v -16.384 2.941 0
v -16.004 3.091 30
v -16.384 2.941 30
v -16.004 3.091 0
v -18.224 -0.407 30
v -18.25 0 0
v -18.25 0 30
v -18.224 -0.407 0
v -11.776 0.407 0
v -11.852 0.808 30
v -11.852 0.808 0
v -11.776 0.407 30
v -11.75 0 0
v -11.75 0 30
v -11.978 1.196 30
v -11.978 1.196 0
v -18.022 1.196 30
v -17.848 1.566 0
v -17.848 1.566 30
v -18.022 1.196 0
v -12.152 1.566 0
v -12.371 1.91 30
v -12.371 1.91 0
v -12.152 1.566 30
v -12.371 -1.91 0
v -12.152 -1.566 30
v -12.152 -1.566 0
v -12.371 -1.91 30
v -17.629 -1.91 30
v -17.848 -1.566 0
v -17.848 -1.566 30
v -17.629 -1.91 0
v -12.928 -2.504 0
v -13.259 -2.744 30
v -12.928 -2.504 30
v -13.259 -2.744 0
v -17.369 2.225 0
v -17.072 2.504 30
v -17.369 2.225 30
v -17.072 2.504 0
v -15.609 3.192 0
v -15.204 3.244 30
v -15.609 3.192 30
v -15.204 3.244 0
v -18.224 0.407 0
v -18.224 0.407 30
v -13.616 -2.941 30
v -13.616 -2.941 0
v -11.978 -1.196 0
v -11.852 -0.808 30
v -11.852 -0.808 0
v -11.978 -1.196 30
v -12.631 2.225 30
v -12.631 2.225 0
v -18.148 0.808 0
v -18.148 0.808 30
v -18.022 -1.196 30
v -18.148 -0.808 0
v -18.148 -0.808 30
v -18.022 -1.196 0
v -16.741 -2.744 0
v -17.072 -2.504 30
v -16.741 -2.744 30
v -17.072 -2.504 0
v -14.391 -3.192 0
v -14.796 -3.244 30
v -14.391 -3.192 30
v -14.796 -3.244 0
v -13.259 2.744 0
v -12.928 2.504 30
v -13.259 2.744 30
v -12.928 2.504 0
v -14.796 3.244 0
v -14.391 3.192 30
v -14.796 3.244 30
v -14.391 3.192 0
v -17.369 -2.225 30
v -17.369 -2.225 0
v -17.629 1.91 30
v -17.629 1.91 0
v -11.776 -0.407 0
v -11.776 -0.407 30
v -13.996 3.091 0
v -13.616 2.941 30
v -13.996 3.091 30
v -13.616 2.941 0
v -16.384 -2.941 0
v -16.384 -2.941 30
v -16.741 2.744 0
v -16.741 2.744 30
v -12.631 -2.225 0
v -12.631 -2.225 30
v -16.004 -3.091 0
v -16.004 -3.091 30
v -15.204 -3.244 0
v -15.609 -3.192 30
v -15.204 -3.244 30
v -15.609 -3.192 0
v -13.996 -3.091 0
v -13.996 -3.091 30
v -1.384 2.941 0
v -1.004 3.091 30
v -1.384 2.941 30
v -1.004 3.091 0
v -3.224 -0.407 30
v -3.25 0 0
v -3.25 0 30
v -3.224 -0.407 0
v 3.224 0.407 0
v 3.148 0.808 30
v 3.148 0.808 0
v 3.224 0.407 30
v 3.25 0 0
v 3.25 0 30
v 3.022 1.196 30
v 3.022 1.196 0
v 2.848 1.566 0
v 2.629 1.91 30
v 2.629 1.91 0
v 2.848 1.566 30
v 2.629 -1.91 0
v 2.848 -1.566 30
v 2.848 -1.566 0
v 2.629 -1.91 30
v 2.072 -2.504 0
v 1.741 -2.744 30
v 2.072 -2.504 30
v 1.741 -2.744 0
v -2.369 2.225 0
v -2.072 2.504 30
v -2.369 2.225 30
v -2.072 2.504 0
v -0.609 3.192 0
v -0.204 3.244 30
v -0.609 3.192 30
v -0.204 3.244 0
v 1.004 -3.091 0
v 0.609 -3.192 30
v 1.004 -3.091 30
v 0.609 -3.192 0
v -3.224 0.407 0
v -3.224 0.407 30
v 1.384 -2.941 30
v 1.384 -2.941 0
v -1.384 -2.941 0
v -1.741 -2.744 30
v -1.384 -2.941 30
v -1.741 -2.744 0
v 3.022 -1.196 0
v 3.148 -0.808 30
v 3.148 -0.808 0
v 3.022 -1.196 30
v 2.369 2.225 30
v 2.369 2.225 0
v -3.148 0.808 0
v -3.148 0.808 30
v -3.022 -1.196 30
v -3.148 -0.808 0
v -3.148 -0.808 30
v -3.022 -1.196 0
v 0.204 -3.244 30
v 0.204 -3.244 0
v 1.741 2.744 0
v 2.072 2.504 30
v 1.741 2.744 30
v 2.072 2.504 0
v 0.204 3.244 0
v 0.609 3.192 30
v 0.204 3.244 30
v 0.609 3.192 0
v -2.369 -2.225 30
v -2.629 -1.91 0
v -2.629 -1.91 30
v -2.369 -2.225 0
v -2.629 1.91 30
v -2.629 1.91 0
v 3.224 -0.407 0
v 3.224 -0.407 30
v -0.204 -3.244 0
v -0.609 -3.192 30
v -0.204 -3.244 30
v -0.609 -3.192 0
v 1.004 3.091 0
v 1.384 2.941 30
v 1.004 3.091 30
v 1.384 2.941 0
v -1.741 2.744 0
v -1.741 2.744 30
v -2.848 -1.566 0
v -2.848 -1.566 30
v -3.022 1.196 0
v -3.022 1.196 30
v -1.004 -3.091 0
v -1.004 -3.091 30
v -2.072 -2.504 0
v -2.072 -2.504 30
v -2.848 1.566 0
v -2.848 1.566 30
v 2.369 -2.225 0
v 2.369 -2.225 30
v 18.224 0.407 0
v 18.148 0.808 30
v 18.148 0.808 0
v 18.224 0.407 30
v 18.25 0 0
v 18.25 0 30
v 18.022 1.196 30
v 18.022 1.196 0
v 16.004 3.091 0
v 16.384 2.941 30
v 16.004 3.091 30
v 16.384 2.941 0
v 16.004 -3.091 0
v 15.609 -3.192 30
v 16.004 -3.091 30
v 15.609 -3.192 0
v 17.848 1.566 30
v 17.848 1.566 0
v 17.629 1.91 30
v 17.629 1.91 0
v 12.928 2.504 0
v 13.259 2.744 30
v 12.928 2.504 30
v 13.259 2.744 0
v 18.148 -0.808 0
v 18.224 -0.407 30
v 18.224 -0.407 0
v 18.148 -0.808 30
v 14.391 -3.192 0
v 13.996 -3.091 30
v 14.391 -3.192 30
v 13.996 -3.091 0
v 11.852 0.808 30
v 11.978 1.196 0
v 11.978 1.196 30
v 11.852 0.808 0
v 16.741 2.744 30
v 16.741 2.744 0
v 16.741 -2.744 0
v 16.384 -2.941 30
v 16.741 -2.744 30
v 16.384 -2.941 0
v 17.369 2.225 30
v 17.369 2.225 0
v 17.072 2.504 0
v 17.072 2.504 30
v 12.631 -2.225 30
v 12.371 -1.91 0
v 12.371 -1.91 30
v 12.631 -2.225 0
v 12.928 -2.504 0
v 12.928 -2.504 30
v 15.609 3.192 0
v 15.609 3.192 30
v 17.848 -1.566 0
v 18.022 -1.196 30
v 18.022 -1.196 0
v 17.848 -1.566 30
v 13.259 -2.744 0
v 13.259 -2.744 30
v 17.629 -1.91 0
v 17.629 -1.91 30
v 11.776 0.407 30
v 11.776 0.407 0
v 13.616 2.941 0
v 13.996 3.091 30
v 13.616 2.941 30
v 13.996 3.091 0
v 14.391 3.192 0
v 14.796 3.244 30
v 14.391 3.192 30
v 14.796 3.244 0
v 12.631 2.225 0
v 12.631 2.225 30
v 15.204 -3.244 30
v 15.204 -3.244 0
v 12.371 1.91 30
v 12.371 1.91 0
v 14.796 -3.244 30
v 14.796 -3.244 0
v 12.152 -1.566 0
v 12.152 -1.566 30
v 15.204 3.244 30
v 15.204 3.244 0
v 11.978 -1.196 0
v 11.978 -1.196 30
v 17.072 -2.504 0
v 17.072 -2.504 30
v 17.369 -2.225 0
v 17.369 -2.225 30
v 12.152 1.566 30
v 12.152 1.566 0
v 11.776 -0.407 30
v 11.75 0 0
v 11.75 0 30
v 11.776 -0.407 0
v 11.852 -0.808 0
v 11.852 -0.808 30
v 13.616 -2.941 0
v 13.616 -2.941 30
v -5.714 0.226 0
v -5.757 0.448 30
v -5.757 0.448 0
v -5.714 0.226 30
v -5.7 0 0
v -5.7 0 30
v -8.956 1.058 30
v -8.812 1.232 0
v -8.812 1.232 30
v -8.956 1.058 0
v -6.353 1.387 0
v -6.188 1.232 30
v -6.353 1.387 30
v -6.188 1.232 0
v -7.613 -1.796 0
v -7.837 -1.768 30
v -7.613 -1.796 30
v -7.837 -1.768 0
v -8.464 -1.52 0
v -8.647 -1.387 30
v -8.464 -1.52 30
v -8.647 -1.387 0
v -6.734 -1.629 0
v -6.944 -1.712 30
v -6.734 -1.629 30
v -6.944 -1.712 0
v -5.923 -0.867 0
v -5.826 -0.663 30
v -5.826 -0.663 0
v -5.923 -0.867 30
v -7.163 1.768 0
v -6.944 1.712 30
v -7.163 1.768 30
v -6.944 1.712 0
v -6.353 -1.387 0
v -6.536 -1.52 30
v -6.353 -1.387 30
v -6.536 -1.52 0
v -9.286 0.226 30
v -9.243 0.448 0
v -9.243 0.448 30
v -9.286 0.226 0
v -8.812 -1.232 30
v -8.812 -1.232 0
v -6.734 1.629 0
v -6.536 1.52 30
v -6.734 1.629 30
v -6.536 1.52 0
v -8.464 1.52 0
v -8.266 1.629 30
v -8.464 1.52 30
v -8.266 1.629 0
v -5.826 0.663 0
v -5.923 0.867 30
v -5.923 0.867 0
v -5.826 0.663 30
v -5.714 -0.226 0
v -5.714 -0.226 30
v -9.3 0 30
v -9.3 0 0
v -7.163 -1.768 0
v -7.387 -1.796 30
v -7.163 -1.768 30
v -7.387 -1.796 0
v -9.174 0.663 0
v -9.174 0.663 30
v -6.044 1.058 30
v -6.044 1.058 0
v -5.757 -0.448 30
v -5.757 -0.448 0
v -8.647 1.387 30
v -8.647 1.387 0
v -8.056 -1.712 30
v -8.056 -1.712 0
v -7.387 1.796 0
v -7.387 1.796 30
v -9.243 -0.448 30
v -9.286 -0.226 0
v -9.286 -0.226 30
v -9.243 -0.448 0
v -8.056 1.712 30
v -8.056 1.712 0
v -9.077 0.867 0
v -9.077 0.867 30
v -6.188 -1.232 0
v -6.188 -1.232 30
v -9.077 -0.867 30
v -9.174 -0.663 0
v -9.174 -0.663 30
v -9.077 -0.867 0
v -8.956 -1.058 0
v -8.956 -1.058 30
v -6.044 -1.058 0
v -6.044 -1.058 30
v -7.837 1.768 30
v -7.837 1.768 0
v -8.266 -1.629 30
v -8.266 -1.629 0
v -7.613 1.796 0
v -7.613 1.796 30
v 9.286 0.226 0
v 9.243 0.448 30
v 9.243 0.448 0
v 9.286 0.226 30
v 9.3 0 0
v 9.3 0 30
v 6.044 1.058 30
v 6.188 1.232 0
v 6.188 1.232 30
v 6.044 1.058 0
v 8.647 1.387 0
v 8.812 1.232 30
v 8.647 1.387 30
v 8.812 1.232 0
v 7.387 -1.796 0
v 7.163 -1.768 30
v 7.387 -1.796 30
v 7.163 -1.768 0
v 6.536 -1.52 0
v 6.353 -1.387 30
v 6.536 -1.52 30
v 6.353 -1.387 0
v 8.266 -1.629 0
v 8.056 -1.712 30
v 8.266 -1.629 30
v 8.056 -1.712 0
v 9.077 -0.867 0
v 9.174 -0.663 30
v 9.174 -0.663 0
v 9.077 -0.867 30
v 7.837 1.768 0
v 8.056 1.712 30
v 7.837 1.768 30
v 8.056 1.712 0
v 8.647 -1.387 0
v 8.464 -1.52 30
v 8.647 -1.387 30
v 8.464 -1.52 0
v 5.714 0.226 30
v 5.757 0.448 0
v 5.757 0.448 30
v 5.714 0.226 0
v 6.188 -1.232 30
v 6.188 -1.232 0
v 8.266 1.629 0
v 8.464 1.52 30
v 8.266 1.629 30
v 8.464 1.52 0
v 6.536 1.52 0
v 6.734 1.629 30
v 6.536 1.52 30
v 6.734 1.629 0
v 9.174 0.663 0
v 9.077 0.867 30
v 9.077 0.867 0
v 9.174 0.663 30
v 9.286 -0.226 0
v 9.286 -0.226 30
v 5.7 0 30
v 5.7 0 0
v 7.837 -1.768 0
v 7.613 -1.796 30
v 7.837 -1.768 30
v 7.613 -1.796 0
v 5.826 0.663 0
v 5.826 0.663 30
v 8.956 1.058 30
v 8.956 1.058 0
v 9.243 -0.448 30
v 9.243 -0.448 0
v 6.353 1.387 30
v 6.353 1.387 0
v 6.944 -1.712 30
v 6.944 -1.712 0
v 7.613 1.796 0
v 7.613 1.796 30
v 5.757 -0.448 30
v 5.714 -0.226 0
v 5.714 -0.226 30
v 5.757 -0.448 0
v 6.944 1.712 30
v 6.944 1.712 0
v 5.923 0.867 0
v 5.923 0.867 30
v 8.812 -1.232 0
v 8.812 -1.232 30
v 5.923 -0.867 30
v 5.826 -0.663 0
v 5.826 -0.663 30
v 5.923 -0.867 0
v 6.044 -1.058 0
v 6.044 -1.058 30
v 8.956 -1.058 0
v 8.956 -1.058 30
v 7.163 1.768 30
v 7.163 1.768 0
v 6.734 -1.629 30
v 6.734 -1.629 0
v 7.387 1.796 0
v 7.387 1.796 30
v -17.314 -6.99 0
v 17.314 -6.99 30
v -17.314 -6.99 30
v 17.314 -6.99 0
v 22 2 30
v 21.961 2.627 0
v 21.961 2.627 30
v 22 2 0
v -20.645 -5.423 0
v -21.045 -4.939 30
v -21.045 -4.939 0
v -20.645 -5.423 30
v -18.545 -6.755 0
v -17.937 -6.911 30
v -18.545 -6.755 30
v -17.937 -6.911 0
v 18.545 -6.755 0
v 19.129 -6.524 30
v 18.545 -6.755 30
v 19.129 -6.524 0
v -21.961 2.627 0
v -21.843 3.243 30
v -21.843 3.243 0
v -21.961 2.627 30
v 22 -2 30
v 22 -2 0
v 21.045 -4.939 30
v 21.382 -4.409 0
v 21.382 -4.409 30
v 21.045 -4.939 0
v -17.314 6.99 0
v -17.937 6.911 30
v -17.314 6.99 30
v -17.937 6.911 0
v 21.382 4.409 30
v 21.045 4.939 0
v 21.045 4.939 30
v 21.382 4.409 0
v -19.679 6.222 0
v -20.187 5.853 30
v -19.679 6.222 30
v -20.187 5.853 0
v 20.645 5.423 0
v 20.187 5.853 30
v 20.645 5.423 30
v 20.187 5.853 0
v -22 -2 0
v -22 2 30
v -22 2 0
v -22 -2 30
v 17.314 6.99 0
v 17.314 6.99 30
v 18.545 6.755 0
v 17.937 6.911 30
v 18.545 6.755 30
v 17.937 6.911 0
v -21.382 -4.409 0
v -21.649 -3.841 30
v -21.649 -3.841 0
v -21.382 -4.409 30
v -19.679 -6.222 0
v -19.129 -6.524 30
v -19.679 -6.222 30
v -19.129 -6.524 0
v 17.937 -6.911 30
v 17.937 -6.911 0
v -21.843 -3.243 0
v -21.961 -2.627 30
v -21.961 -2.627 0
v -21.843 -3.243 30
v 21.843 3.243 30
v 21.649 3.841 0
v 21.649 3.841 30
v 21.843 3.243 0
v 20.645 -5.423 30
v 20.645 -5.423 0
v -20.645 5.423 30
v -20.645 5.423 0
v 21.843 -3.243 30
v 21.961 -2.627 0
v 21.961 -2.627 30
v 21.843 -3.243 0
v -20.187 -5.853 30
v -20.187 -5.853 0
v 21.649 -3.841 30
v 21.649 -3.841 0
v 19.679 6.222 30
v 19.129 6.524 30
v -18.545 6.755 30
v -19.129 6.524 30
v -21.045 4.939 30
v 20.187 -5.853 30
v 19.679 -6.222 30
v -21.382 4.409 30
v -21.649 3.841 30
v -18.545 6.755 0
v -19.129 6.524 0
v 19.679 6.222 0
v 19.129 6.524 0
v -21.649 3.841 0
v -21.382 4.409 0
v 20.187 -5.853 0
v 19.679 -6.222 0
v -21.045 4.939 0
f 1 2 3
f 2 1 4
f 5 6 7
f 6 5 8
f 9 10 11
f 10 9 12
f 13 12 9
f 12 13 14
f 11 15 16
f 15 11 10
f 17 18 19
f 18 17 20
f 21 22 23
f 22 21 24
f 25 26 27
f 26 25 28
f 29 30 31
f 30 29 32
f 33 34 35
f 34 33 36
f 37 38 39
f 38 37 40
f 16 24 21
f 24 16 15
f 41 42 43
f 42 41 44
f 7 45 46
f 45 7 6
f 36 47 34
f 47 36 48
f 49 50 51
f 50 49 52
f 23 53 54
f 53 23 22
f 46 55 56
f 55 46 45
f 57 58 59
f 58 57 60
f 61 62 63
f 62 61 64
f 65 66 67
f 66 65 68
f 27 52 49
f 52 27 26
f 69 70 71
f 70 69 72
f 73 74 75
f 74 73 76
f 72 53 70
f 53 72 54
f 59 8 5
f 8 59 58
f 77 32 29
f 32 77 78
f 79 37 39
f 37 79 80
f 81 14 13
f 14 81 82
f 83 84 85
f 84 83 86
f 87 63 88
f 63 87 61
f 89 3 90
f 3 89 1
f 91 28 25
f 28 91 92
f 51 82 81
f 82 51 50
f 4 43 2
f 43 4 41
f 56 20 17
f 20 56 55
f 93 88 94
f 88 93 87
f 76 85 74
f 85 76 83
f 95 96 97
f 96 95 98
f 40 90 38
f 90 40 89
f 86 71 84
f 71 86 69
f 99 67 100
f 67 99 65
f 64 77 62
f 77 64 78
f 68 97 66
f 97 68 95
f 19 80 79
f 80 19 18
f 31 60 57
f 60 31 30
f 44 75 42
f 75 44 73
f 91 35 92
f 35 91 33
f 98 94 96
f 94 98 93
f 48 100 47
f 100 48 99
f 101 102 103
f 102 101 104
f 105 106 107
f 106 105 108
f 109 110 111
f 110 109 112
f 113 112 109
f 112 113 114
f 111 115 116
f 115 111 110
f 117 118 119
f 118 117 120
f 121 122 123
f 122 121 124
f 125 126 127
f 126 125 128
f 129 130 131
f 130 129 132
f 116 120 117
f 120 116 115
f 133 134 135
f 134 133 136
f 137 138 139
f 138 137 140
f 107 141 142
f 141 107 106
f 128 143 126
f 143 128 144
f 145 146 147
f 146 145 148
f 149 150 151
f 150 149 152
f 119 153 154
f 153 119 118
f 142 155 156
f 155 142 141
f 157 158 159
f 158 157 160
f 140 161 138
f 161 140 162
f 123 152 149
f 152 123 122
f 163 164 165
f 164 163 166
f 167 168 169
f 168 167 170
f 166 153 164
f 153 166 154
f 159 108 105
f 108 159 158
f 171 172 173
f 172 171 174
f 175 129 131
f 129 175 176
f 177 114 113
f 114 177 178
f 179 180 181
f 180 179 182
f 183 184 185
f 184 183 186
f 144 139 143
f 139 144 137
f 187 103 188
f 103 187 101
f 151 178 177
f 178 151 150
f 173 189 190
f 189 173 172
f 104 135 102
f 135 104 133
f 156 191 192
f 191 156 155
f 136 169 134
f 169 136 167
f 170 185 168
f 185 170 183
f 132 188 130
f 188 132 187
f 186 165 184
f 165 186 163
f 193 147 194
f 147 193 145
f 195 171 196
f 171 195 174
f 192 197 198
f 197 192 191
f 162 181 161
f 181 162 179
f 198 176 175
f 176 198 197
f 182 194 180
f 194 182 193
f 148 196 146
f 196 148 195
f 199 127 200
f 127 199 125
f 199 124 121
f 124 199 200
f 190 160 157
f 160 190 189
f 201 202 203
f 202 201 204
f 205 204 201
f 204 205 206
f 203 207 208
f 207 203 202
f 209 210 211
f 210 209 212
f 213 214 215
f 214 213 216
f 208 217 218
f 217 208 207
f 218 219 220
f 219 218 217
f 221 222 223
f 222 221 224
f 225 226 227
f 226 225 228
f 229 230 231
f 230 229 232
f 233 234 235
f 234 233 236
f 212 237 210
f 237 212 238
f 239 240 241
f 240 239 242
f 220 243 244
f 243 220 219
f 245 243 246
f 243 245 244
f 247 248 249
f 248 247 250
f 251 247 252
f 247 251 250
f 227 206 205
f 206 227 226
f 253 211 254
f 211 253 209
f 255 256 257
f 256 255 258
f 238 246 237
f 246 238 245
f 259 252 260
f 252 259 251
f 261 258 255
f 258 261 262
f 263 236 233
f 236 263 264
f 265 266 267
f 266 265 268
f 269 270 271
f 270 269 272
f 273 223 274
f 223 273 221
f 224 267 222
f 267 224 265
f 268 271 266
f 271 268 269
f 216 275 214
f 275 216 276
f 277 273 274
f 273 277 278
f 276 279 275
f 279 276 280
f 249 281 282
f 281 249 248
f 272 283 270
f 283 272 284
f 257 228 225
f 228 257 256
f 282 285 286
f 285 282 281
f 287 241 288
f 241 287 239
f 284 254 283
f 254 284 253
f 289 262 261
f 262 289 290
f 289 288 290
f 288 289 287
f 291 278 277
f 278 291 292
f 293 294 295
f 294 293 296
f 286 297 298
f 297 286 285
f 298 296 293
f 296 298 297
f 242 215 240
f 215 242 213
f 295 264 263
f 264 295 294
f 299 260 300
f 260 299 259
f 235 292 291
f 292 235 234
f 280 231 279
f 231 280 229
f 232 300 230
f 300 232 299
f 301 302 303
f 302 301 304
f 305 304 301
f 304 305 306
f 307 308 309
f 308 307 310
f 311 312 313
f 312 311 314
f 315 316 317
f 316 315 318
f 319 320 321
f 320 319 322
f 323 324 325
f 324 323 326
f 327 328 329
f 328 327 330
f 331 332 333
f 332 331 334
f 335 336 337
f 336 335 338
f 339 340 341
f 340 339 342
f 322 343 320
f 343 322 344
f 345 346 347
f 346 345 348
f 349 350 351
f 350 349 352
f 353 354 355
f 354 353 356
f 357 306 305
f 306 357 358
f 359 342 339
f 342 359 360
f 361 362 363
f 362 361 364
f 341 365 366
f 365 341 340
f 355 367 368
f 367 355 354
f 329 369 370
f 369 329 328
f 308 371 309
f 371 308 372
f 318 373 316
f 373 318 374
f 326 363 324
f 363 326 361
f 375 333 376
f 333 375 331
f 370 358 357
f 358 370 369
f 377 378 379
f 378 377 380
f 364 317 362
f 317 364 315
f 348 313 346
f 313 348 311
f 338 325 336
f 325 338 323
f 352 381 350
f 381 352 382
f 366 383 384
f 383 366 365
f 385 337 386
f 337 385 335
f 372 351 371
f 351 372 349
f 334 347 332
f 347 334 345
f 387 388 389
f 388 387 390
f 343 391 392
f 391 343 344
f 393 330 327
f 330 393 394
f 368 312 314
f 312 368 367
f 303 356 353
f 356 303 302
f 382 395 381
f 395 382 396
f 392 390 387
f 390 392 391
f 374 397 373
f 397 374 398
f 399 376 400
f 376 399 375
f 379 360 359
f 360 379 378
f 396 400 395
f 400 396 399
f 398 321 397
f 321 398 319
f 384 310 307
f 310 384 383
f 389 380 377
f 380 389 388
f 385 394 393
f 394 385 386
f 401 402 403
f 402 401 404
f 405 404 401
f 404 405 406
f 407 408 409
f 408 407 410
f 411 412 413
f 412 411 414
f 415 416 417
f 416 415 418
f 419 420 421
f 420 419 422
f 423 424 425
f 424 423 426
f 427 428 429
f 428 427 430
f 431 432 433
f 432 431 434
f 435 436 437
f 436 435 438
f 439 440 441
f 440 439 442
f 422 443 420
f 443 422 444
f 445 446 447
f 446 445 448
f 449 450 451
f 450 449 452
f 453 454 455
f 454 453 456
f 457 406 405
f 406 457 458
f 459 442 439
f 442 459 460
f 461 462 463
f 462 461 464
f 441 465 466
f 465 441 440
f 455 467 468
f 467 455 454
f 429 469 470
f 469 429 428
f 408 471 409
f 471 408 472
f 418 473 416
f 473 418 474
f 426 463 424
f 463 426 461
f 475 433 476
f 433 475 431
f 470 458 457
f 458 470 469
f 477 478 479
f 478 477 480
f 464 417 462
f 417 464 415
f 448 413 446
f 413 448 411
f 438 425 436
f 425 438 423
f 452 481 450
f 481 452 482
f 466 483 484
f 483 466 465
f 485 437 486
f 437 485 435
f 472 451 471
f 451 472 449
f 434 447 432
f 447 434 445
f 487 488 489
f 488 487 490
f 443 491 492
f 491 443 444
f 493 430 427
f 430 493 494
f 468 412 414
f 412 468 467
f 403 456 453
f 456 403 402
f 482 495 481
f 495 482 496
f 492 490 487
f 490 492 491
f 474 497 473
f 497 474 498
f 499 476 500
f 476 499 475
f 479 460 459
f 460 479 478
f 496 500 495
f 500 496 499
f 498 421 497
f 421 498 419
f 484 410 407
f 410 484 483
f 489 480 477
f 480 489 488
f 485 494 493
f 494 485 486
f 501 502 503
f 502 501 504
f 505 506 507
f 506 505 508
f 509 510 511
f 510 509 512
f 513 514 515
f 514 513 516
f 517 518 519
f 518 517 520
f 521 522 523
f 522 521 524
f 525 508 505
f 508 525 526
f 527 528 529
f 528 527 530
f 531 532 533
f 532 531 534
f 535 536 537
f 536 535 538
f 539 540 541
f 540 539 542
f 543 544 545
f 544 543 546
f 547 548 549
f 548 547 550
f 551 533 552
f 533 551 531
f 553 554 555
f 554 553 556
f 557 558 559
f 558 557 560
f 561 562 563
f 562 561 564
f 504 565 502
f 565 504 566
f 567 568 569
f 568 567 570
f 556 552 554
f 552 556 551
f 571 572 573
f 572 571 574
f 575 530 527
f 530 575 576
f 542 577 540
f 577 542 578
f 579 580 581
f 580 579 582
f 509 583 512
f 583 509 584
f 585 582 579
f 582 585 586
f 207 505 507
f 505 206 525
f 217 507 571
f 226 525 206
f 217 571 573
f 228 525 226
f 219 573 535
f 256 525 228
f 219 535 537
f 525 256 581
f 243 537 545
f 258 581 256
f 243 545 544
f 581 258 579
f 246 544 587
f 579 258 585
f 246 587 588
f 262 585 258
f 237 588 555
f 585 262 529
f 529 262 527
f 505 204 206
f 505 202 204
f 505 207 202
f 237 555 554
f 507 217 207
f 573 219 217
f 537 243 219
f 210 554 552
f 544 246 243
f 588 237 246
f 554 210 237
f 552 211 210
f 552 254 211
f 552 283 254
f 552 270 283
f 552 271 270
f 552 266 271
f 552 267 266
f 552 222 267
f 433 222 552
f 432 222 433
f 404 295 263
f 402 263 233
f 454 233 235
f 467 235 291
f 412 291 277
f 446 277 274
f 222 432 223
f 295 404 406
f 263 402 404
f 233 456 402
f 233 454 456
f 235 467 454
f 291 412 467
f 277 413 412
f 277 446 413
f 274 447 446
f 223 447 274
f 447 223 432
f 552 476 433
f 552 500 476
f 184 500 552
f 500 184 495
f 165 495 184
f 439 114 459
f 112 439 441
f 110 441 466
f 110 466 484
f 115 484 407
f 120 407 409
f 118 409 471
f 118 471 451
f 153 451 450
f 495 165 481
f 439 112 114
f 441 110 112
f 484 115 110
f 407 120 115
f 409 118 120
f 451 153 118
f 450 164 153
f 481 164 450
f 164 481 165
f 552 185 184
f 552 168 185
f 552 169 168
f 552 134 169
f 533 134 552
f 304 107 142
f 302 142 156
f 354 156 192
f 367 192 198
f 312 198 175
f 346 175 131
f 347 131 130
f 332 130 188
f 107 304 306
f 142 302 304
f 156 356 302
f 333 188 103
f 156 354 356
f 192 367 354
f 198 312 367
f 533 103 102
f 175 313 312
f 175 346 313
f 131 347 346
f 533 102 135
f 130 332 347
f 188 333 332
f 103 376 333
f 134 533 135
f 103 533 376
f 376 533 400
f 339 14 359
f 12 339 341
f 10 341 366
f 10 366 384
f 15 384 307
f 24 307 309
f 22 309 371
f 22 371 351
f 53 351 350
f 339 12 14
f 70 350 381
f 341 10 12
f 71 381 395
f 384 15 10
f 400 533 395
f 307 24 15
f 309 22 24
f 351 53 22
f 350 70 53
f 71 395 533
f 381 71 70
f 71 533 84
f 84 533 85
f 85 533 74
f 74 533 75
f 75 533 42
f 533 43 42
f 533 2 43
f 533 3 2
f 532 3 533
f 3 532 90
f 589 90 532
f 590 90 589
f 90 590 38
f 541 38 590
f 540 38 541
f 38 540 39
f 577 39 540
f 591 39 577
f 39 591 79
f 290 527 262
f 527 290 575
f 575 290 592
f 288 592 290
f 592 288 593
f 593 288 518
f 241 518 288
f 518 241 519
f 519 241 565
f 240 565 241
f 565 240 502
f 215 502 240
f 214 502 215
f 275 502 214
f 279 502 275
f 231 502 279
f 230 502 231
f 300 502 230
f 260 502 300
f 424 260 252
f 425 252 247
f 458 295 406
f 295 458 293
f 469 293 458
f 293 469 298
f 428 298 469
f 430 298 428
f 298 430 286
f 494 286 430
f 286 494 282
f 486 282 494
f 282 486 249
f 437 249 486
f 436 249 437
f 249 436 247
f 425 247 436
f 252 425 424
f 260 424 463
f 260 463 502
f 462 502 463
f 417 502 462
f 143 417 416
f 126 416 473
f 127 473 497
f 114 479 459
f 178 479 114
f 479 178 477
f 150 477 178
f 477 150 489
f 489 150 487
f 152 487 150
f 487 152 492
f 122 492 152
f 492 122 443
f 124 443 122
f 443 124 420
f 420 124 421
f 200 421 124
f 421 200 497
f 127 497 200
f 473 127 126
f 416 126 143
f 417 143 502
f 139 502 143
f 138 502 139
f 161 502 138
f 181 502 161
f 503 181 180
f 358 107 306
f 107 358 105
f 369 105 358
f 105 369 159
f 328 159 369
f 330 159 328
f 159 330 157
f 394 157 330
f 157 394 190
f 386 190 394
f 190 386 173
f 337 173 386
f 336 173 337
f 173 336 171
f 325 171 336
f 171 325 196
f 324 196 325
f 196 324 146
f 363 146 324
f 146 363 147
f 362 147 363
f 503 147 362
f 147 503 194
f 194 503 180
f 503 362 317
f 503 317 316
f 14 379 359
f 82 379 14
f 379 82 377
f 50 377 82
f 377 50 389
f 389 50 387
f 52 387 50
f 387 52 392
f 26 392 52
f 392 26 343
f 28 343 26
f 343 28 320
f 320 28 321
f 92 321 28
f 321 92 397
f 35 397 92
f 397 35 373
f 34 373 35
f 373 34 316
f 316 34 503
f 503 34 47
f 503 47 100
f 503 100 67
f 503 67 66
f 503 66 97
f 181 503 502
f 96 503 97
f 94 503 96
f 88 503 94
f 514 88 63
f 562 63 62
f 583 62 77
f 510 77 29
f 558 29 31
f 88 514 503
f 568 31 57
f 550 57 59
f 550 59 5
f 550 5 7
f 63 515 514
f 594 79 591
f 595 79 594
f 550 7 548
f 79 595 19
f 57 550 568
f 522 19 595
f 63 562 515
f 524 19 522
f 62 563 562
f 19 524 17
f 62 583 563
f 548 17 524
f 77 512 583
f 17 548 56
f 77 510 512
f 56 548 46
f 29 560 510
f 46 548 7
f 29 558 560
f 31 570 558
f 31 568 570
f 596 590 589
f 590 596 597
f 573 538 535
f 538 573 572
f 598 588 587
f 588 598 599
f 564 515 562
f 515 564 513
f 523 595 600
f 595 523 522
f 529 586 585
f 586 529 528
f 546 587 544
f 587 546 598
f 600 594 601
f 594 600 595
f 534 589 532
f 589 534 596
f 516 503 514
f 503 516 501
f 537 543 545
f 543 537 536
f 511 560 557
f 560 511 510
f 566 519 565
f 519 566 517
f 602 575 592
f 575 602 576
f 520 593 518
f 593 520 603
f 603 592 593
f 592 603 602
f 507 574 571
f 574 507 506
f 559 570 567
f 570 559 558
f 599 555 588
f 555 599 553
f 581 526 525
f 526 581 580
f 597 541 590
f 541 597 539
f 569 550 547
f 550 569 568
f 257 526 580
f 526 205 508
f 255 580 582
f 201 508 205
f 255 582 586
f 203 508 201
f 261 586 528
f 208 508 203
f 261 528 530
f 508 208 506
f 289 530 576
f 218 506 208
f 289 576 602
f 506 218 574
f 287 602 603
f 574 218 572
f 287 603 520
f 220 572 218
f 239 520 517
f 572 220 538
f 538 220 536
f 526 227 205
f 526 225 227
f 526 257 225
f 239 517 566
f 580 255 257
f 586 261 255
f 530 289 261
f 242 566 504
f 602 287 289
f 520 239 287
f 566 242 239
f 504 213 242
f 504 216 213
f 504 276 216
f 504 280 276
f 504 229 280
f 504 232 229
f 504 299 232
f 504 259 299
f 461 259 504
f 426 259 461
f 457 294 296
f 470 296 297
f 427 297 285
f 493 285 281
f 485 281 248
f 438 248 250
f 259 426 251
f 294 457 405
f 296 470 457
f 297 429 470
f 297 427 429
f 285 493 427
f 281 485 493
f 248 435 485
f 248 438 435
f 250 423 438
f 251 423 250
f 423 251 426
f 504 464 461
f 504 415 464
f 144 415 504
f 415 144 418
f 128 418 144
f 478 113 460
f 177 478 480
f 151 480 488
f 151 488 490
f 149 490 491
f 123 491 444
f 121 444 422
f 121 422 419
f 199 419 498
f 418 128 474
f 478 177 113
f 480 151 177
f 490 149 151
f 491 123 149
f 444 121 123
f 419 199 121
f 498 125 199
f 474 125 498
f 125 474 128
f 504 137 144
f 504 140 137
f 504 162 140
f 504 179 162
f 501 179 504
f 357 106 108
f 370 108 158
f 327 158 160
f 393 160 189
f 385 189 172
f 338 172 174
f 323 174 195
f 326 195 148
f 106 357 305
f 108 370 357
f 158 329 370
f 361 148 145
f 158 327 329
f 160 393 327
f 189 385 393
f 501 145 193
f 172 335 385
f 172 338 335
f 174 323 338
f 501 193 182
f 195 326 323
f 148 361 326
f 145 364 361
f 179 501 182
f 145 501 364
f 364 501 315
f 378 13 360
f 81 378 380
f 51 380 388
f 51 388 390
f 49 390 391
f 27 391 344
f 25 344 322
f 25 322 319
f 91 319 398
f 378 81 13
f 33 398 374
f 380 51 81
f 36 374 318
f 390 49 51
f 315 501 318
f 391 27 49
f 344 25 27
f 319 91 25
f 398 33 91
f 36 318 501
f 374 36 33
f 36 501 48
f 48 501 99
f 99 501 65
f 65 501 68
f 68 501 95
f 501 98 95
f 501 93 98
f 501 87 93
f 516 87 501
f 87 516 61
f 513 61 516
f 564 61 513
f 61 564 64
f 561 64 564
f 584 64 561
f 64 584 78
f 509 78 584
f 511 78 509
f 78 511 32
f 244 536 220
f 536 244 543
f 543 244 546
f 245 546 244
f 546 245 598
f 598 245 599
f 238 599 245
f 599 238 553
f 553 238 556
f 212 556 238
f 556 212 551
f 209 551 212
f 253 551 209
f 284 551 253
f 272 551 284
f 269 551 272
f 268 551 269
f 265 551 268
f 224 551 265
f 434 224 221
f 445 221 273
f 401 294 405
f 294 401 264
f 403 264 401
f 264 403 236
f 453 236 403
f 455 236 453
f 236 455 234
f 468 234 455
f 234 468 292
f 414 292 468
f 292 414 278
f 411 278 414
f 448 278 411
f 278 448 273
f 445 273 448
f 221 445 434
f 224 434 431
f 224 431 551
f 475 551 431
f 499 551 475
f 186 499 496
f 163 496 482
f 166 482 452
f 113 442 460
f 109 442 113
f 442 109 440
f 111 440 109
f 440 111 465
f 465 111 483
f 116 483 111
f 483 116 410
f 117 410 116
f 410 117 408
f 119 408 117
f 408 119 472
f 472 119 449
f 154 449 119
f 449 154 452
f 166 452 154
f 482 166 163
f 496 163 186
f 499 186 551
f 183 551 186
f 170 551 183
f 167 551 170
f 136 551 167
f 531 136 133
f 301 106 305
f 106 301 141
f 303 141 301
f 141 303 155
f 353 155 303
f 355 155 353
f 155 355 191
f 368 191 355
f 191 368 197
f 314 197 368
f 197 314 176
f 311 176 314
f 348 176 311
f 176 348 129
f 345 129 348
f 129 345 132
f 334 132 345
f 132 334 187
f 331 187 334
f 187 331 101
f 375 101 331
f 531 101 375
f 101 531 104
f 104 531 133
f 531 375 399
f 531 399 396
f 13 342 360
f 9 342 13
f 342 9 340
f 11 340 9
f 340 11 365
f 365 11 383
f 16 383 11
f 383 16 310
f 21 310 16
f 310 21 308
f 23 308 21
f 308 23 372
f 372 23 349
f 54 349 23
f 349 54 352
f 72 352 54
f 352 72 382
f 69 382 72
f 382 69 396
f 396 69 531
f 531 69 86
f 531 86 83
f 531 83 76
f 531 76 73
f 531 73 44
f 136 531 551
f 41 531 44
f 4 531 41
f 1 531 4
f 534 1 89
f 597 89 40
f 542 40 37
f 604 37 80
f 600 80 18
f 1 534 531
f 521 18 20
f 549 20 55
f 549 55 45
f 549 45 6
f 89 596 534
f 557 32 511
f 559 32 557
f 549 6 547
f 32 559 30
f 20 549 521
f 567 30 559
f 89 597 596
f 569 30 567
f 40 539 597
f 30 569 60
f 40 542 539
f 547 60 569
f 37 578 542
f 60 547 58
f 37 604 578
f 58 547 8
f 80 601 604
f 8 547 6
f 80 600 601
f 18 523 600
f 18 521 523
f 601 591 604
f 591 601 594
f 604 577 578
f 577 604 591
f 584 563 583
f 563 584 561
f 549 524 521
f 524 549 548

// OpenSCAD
$fn = 50;


difference() {
	union() {
		*color(alpha = 1.0000000000, c = "gray") {
			translate(v = [0, 7, 0]) {
				linear_extrude(height = 1) {
					text(font = "Arial:style=Bold", halign = "center", size = 4.5000000000, text = "COMMENT plate main", valign = "center");
				}
			}
		}
		hull() {
			translate(v = [-17.0000000000, 2.0000000000, 0]) {
				cylinder(h = 30, r = 5);
			}
			translate(v = [17.0000000000, 2.0000000000, 0]) {
				cylinder(h = 30, r = 5);
			}
			translate(v = [-17.0000000000, -2.0000000000, 0]) {
				cylinder(h = 30, r = 5);
			}
			translate(v = [17.0000000000, -2.0000000000, 0]) {
				cylinder(h = 30, r = 5);
			}
		}
	}
	union() {
		*color(alpha = 1.0000000000, c = "gray") {
			translate(v = [0, 7, 0]) {
				linear_extrude(height = 1) {
					text(font = "Arial:style=Bold", halign = "center", size = 4.5000000000, text = "COMMENT holes main", valign = "center");
				}
			}
		}
		translate(v = [-15.0000000000, 0.0000000000, 0]) {
			translate(v = [0, 0, -100]) {
				cylinder(h = 200, r = 3.2500000000);
			}
		}
		translate(v = [0, 0, -100]) {
			cylinder(h = 200, r = 3.2500000000);
		}
		translate(v = [15.0000000000, 0.0000000000, 0]) {
			translate(v = [0, 0, -100]) {
				cylinder(h = 200, r = 3.2500000000);
			}
		}
		translate(v = [-15.0000000000, 0.0000000000, 0]) {
			translate(v = [0, 0, -100]) {
				cylinder(h = 200, r = 1.8000000000);
			}
		}
		translate(v = [-7.5000000000, 0.0000000000, 0]) {
			translate(v = [0, 0, -100]) {
				cylinder(h = 200, r = 1.8000000000);
			}
		}
		translate(v = [0, 0, -100]) {
			cylinder(h = 200, r = 1.8000000000);
		}
		translate(v = [7.5000000000, 0.0000000000, 0]) {
			translate(v = [0, 0, -100]) {
				cylinder(h = 200, r = 1.8000000000);
			}
		}
		translate(v = [15.0000000000, 0.0000000000, 0]) {
			translate(v = [0, 0, -100]) {
				cylinder(h = 200, r = 1.8000000000);
			}
		}
	}
}
